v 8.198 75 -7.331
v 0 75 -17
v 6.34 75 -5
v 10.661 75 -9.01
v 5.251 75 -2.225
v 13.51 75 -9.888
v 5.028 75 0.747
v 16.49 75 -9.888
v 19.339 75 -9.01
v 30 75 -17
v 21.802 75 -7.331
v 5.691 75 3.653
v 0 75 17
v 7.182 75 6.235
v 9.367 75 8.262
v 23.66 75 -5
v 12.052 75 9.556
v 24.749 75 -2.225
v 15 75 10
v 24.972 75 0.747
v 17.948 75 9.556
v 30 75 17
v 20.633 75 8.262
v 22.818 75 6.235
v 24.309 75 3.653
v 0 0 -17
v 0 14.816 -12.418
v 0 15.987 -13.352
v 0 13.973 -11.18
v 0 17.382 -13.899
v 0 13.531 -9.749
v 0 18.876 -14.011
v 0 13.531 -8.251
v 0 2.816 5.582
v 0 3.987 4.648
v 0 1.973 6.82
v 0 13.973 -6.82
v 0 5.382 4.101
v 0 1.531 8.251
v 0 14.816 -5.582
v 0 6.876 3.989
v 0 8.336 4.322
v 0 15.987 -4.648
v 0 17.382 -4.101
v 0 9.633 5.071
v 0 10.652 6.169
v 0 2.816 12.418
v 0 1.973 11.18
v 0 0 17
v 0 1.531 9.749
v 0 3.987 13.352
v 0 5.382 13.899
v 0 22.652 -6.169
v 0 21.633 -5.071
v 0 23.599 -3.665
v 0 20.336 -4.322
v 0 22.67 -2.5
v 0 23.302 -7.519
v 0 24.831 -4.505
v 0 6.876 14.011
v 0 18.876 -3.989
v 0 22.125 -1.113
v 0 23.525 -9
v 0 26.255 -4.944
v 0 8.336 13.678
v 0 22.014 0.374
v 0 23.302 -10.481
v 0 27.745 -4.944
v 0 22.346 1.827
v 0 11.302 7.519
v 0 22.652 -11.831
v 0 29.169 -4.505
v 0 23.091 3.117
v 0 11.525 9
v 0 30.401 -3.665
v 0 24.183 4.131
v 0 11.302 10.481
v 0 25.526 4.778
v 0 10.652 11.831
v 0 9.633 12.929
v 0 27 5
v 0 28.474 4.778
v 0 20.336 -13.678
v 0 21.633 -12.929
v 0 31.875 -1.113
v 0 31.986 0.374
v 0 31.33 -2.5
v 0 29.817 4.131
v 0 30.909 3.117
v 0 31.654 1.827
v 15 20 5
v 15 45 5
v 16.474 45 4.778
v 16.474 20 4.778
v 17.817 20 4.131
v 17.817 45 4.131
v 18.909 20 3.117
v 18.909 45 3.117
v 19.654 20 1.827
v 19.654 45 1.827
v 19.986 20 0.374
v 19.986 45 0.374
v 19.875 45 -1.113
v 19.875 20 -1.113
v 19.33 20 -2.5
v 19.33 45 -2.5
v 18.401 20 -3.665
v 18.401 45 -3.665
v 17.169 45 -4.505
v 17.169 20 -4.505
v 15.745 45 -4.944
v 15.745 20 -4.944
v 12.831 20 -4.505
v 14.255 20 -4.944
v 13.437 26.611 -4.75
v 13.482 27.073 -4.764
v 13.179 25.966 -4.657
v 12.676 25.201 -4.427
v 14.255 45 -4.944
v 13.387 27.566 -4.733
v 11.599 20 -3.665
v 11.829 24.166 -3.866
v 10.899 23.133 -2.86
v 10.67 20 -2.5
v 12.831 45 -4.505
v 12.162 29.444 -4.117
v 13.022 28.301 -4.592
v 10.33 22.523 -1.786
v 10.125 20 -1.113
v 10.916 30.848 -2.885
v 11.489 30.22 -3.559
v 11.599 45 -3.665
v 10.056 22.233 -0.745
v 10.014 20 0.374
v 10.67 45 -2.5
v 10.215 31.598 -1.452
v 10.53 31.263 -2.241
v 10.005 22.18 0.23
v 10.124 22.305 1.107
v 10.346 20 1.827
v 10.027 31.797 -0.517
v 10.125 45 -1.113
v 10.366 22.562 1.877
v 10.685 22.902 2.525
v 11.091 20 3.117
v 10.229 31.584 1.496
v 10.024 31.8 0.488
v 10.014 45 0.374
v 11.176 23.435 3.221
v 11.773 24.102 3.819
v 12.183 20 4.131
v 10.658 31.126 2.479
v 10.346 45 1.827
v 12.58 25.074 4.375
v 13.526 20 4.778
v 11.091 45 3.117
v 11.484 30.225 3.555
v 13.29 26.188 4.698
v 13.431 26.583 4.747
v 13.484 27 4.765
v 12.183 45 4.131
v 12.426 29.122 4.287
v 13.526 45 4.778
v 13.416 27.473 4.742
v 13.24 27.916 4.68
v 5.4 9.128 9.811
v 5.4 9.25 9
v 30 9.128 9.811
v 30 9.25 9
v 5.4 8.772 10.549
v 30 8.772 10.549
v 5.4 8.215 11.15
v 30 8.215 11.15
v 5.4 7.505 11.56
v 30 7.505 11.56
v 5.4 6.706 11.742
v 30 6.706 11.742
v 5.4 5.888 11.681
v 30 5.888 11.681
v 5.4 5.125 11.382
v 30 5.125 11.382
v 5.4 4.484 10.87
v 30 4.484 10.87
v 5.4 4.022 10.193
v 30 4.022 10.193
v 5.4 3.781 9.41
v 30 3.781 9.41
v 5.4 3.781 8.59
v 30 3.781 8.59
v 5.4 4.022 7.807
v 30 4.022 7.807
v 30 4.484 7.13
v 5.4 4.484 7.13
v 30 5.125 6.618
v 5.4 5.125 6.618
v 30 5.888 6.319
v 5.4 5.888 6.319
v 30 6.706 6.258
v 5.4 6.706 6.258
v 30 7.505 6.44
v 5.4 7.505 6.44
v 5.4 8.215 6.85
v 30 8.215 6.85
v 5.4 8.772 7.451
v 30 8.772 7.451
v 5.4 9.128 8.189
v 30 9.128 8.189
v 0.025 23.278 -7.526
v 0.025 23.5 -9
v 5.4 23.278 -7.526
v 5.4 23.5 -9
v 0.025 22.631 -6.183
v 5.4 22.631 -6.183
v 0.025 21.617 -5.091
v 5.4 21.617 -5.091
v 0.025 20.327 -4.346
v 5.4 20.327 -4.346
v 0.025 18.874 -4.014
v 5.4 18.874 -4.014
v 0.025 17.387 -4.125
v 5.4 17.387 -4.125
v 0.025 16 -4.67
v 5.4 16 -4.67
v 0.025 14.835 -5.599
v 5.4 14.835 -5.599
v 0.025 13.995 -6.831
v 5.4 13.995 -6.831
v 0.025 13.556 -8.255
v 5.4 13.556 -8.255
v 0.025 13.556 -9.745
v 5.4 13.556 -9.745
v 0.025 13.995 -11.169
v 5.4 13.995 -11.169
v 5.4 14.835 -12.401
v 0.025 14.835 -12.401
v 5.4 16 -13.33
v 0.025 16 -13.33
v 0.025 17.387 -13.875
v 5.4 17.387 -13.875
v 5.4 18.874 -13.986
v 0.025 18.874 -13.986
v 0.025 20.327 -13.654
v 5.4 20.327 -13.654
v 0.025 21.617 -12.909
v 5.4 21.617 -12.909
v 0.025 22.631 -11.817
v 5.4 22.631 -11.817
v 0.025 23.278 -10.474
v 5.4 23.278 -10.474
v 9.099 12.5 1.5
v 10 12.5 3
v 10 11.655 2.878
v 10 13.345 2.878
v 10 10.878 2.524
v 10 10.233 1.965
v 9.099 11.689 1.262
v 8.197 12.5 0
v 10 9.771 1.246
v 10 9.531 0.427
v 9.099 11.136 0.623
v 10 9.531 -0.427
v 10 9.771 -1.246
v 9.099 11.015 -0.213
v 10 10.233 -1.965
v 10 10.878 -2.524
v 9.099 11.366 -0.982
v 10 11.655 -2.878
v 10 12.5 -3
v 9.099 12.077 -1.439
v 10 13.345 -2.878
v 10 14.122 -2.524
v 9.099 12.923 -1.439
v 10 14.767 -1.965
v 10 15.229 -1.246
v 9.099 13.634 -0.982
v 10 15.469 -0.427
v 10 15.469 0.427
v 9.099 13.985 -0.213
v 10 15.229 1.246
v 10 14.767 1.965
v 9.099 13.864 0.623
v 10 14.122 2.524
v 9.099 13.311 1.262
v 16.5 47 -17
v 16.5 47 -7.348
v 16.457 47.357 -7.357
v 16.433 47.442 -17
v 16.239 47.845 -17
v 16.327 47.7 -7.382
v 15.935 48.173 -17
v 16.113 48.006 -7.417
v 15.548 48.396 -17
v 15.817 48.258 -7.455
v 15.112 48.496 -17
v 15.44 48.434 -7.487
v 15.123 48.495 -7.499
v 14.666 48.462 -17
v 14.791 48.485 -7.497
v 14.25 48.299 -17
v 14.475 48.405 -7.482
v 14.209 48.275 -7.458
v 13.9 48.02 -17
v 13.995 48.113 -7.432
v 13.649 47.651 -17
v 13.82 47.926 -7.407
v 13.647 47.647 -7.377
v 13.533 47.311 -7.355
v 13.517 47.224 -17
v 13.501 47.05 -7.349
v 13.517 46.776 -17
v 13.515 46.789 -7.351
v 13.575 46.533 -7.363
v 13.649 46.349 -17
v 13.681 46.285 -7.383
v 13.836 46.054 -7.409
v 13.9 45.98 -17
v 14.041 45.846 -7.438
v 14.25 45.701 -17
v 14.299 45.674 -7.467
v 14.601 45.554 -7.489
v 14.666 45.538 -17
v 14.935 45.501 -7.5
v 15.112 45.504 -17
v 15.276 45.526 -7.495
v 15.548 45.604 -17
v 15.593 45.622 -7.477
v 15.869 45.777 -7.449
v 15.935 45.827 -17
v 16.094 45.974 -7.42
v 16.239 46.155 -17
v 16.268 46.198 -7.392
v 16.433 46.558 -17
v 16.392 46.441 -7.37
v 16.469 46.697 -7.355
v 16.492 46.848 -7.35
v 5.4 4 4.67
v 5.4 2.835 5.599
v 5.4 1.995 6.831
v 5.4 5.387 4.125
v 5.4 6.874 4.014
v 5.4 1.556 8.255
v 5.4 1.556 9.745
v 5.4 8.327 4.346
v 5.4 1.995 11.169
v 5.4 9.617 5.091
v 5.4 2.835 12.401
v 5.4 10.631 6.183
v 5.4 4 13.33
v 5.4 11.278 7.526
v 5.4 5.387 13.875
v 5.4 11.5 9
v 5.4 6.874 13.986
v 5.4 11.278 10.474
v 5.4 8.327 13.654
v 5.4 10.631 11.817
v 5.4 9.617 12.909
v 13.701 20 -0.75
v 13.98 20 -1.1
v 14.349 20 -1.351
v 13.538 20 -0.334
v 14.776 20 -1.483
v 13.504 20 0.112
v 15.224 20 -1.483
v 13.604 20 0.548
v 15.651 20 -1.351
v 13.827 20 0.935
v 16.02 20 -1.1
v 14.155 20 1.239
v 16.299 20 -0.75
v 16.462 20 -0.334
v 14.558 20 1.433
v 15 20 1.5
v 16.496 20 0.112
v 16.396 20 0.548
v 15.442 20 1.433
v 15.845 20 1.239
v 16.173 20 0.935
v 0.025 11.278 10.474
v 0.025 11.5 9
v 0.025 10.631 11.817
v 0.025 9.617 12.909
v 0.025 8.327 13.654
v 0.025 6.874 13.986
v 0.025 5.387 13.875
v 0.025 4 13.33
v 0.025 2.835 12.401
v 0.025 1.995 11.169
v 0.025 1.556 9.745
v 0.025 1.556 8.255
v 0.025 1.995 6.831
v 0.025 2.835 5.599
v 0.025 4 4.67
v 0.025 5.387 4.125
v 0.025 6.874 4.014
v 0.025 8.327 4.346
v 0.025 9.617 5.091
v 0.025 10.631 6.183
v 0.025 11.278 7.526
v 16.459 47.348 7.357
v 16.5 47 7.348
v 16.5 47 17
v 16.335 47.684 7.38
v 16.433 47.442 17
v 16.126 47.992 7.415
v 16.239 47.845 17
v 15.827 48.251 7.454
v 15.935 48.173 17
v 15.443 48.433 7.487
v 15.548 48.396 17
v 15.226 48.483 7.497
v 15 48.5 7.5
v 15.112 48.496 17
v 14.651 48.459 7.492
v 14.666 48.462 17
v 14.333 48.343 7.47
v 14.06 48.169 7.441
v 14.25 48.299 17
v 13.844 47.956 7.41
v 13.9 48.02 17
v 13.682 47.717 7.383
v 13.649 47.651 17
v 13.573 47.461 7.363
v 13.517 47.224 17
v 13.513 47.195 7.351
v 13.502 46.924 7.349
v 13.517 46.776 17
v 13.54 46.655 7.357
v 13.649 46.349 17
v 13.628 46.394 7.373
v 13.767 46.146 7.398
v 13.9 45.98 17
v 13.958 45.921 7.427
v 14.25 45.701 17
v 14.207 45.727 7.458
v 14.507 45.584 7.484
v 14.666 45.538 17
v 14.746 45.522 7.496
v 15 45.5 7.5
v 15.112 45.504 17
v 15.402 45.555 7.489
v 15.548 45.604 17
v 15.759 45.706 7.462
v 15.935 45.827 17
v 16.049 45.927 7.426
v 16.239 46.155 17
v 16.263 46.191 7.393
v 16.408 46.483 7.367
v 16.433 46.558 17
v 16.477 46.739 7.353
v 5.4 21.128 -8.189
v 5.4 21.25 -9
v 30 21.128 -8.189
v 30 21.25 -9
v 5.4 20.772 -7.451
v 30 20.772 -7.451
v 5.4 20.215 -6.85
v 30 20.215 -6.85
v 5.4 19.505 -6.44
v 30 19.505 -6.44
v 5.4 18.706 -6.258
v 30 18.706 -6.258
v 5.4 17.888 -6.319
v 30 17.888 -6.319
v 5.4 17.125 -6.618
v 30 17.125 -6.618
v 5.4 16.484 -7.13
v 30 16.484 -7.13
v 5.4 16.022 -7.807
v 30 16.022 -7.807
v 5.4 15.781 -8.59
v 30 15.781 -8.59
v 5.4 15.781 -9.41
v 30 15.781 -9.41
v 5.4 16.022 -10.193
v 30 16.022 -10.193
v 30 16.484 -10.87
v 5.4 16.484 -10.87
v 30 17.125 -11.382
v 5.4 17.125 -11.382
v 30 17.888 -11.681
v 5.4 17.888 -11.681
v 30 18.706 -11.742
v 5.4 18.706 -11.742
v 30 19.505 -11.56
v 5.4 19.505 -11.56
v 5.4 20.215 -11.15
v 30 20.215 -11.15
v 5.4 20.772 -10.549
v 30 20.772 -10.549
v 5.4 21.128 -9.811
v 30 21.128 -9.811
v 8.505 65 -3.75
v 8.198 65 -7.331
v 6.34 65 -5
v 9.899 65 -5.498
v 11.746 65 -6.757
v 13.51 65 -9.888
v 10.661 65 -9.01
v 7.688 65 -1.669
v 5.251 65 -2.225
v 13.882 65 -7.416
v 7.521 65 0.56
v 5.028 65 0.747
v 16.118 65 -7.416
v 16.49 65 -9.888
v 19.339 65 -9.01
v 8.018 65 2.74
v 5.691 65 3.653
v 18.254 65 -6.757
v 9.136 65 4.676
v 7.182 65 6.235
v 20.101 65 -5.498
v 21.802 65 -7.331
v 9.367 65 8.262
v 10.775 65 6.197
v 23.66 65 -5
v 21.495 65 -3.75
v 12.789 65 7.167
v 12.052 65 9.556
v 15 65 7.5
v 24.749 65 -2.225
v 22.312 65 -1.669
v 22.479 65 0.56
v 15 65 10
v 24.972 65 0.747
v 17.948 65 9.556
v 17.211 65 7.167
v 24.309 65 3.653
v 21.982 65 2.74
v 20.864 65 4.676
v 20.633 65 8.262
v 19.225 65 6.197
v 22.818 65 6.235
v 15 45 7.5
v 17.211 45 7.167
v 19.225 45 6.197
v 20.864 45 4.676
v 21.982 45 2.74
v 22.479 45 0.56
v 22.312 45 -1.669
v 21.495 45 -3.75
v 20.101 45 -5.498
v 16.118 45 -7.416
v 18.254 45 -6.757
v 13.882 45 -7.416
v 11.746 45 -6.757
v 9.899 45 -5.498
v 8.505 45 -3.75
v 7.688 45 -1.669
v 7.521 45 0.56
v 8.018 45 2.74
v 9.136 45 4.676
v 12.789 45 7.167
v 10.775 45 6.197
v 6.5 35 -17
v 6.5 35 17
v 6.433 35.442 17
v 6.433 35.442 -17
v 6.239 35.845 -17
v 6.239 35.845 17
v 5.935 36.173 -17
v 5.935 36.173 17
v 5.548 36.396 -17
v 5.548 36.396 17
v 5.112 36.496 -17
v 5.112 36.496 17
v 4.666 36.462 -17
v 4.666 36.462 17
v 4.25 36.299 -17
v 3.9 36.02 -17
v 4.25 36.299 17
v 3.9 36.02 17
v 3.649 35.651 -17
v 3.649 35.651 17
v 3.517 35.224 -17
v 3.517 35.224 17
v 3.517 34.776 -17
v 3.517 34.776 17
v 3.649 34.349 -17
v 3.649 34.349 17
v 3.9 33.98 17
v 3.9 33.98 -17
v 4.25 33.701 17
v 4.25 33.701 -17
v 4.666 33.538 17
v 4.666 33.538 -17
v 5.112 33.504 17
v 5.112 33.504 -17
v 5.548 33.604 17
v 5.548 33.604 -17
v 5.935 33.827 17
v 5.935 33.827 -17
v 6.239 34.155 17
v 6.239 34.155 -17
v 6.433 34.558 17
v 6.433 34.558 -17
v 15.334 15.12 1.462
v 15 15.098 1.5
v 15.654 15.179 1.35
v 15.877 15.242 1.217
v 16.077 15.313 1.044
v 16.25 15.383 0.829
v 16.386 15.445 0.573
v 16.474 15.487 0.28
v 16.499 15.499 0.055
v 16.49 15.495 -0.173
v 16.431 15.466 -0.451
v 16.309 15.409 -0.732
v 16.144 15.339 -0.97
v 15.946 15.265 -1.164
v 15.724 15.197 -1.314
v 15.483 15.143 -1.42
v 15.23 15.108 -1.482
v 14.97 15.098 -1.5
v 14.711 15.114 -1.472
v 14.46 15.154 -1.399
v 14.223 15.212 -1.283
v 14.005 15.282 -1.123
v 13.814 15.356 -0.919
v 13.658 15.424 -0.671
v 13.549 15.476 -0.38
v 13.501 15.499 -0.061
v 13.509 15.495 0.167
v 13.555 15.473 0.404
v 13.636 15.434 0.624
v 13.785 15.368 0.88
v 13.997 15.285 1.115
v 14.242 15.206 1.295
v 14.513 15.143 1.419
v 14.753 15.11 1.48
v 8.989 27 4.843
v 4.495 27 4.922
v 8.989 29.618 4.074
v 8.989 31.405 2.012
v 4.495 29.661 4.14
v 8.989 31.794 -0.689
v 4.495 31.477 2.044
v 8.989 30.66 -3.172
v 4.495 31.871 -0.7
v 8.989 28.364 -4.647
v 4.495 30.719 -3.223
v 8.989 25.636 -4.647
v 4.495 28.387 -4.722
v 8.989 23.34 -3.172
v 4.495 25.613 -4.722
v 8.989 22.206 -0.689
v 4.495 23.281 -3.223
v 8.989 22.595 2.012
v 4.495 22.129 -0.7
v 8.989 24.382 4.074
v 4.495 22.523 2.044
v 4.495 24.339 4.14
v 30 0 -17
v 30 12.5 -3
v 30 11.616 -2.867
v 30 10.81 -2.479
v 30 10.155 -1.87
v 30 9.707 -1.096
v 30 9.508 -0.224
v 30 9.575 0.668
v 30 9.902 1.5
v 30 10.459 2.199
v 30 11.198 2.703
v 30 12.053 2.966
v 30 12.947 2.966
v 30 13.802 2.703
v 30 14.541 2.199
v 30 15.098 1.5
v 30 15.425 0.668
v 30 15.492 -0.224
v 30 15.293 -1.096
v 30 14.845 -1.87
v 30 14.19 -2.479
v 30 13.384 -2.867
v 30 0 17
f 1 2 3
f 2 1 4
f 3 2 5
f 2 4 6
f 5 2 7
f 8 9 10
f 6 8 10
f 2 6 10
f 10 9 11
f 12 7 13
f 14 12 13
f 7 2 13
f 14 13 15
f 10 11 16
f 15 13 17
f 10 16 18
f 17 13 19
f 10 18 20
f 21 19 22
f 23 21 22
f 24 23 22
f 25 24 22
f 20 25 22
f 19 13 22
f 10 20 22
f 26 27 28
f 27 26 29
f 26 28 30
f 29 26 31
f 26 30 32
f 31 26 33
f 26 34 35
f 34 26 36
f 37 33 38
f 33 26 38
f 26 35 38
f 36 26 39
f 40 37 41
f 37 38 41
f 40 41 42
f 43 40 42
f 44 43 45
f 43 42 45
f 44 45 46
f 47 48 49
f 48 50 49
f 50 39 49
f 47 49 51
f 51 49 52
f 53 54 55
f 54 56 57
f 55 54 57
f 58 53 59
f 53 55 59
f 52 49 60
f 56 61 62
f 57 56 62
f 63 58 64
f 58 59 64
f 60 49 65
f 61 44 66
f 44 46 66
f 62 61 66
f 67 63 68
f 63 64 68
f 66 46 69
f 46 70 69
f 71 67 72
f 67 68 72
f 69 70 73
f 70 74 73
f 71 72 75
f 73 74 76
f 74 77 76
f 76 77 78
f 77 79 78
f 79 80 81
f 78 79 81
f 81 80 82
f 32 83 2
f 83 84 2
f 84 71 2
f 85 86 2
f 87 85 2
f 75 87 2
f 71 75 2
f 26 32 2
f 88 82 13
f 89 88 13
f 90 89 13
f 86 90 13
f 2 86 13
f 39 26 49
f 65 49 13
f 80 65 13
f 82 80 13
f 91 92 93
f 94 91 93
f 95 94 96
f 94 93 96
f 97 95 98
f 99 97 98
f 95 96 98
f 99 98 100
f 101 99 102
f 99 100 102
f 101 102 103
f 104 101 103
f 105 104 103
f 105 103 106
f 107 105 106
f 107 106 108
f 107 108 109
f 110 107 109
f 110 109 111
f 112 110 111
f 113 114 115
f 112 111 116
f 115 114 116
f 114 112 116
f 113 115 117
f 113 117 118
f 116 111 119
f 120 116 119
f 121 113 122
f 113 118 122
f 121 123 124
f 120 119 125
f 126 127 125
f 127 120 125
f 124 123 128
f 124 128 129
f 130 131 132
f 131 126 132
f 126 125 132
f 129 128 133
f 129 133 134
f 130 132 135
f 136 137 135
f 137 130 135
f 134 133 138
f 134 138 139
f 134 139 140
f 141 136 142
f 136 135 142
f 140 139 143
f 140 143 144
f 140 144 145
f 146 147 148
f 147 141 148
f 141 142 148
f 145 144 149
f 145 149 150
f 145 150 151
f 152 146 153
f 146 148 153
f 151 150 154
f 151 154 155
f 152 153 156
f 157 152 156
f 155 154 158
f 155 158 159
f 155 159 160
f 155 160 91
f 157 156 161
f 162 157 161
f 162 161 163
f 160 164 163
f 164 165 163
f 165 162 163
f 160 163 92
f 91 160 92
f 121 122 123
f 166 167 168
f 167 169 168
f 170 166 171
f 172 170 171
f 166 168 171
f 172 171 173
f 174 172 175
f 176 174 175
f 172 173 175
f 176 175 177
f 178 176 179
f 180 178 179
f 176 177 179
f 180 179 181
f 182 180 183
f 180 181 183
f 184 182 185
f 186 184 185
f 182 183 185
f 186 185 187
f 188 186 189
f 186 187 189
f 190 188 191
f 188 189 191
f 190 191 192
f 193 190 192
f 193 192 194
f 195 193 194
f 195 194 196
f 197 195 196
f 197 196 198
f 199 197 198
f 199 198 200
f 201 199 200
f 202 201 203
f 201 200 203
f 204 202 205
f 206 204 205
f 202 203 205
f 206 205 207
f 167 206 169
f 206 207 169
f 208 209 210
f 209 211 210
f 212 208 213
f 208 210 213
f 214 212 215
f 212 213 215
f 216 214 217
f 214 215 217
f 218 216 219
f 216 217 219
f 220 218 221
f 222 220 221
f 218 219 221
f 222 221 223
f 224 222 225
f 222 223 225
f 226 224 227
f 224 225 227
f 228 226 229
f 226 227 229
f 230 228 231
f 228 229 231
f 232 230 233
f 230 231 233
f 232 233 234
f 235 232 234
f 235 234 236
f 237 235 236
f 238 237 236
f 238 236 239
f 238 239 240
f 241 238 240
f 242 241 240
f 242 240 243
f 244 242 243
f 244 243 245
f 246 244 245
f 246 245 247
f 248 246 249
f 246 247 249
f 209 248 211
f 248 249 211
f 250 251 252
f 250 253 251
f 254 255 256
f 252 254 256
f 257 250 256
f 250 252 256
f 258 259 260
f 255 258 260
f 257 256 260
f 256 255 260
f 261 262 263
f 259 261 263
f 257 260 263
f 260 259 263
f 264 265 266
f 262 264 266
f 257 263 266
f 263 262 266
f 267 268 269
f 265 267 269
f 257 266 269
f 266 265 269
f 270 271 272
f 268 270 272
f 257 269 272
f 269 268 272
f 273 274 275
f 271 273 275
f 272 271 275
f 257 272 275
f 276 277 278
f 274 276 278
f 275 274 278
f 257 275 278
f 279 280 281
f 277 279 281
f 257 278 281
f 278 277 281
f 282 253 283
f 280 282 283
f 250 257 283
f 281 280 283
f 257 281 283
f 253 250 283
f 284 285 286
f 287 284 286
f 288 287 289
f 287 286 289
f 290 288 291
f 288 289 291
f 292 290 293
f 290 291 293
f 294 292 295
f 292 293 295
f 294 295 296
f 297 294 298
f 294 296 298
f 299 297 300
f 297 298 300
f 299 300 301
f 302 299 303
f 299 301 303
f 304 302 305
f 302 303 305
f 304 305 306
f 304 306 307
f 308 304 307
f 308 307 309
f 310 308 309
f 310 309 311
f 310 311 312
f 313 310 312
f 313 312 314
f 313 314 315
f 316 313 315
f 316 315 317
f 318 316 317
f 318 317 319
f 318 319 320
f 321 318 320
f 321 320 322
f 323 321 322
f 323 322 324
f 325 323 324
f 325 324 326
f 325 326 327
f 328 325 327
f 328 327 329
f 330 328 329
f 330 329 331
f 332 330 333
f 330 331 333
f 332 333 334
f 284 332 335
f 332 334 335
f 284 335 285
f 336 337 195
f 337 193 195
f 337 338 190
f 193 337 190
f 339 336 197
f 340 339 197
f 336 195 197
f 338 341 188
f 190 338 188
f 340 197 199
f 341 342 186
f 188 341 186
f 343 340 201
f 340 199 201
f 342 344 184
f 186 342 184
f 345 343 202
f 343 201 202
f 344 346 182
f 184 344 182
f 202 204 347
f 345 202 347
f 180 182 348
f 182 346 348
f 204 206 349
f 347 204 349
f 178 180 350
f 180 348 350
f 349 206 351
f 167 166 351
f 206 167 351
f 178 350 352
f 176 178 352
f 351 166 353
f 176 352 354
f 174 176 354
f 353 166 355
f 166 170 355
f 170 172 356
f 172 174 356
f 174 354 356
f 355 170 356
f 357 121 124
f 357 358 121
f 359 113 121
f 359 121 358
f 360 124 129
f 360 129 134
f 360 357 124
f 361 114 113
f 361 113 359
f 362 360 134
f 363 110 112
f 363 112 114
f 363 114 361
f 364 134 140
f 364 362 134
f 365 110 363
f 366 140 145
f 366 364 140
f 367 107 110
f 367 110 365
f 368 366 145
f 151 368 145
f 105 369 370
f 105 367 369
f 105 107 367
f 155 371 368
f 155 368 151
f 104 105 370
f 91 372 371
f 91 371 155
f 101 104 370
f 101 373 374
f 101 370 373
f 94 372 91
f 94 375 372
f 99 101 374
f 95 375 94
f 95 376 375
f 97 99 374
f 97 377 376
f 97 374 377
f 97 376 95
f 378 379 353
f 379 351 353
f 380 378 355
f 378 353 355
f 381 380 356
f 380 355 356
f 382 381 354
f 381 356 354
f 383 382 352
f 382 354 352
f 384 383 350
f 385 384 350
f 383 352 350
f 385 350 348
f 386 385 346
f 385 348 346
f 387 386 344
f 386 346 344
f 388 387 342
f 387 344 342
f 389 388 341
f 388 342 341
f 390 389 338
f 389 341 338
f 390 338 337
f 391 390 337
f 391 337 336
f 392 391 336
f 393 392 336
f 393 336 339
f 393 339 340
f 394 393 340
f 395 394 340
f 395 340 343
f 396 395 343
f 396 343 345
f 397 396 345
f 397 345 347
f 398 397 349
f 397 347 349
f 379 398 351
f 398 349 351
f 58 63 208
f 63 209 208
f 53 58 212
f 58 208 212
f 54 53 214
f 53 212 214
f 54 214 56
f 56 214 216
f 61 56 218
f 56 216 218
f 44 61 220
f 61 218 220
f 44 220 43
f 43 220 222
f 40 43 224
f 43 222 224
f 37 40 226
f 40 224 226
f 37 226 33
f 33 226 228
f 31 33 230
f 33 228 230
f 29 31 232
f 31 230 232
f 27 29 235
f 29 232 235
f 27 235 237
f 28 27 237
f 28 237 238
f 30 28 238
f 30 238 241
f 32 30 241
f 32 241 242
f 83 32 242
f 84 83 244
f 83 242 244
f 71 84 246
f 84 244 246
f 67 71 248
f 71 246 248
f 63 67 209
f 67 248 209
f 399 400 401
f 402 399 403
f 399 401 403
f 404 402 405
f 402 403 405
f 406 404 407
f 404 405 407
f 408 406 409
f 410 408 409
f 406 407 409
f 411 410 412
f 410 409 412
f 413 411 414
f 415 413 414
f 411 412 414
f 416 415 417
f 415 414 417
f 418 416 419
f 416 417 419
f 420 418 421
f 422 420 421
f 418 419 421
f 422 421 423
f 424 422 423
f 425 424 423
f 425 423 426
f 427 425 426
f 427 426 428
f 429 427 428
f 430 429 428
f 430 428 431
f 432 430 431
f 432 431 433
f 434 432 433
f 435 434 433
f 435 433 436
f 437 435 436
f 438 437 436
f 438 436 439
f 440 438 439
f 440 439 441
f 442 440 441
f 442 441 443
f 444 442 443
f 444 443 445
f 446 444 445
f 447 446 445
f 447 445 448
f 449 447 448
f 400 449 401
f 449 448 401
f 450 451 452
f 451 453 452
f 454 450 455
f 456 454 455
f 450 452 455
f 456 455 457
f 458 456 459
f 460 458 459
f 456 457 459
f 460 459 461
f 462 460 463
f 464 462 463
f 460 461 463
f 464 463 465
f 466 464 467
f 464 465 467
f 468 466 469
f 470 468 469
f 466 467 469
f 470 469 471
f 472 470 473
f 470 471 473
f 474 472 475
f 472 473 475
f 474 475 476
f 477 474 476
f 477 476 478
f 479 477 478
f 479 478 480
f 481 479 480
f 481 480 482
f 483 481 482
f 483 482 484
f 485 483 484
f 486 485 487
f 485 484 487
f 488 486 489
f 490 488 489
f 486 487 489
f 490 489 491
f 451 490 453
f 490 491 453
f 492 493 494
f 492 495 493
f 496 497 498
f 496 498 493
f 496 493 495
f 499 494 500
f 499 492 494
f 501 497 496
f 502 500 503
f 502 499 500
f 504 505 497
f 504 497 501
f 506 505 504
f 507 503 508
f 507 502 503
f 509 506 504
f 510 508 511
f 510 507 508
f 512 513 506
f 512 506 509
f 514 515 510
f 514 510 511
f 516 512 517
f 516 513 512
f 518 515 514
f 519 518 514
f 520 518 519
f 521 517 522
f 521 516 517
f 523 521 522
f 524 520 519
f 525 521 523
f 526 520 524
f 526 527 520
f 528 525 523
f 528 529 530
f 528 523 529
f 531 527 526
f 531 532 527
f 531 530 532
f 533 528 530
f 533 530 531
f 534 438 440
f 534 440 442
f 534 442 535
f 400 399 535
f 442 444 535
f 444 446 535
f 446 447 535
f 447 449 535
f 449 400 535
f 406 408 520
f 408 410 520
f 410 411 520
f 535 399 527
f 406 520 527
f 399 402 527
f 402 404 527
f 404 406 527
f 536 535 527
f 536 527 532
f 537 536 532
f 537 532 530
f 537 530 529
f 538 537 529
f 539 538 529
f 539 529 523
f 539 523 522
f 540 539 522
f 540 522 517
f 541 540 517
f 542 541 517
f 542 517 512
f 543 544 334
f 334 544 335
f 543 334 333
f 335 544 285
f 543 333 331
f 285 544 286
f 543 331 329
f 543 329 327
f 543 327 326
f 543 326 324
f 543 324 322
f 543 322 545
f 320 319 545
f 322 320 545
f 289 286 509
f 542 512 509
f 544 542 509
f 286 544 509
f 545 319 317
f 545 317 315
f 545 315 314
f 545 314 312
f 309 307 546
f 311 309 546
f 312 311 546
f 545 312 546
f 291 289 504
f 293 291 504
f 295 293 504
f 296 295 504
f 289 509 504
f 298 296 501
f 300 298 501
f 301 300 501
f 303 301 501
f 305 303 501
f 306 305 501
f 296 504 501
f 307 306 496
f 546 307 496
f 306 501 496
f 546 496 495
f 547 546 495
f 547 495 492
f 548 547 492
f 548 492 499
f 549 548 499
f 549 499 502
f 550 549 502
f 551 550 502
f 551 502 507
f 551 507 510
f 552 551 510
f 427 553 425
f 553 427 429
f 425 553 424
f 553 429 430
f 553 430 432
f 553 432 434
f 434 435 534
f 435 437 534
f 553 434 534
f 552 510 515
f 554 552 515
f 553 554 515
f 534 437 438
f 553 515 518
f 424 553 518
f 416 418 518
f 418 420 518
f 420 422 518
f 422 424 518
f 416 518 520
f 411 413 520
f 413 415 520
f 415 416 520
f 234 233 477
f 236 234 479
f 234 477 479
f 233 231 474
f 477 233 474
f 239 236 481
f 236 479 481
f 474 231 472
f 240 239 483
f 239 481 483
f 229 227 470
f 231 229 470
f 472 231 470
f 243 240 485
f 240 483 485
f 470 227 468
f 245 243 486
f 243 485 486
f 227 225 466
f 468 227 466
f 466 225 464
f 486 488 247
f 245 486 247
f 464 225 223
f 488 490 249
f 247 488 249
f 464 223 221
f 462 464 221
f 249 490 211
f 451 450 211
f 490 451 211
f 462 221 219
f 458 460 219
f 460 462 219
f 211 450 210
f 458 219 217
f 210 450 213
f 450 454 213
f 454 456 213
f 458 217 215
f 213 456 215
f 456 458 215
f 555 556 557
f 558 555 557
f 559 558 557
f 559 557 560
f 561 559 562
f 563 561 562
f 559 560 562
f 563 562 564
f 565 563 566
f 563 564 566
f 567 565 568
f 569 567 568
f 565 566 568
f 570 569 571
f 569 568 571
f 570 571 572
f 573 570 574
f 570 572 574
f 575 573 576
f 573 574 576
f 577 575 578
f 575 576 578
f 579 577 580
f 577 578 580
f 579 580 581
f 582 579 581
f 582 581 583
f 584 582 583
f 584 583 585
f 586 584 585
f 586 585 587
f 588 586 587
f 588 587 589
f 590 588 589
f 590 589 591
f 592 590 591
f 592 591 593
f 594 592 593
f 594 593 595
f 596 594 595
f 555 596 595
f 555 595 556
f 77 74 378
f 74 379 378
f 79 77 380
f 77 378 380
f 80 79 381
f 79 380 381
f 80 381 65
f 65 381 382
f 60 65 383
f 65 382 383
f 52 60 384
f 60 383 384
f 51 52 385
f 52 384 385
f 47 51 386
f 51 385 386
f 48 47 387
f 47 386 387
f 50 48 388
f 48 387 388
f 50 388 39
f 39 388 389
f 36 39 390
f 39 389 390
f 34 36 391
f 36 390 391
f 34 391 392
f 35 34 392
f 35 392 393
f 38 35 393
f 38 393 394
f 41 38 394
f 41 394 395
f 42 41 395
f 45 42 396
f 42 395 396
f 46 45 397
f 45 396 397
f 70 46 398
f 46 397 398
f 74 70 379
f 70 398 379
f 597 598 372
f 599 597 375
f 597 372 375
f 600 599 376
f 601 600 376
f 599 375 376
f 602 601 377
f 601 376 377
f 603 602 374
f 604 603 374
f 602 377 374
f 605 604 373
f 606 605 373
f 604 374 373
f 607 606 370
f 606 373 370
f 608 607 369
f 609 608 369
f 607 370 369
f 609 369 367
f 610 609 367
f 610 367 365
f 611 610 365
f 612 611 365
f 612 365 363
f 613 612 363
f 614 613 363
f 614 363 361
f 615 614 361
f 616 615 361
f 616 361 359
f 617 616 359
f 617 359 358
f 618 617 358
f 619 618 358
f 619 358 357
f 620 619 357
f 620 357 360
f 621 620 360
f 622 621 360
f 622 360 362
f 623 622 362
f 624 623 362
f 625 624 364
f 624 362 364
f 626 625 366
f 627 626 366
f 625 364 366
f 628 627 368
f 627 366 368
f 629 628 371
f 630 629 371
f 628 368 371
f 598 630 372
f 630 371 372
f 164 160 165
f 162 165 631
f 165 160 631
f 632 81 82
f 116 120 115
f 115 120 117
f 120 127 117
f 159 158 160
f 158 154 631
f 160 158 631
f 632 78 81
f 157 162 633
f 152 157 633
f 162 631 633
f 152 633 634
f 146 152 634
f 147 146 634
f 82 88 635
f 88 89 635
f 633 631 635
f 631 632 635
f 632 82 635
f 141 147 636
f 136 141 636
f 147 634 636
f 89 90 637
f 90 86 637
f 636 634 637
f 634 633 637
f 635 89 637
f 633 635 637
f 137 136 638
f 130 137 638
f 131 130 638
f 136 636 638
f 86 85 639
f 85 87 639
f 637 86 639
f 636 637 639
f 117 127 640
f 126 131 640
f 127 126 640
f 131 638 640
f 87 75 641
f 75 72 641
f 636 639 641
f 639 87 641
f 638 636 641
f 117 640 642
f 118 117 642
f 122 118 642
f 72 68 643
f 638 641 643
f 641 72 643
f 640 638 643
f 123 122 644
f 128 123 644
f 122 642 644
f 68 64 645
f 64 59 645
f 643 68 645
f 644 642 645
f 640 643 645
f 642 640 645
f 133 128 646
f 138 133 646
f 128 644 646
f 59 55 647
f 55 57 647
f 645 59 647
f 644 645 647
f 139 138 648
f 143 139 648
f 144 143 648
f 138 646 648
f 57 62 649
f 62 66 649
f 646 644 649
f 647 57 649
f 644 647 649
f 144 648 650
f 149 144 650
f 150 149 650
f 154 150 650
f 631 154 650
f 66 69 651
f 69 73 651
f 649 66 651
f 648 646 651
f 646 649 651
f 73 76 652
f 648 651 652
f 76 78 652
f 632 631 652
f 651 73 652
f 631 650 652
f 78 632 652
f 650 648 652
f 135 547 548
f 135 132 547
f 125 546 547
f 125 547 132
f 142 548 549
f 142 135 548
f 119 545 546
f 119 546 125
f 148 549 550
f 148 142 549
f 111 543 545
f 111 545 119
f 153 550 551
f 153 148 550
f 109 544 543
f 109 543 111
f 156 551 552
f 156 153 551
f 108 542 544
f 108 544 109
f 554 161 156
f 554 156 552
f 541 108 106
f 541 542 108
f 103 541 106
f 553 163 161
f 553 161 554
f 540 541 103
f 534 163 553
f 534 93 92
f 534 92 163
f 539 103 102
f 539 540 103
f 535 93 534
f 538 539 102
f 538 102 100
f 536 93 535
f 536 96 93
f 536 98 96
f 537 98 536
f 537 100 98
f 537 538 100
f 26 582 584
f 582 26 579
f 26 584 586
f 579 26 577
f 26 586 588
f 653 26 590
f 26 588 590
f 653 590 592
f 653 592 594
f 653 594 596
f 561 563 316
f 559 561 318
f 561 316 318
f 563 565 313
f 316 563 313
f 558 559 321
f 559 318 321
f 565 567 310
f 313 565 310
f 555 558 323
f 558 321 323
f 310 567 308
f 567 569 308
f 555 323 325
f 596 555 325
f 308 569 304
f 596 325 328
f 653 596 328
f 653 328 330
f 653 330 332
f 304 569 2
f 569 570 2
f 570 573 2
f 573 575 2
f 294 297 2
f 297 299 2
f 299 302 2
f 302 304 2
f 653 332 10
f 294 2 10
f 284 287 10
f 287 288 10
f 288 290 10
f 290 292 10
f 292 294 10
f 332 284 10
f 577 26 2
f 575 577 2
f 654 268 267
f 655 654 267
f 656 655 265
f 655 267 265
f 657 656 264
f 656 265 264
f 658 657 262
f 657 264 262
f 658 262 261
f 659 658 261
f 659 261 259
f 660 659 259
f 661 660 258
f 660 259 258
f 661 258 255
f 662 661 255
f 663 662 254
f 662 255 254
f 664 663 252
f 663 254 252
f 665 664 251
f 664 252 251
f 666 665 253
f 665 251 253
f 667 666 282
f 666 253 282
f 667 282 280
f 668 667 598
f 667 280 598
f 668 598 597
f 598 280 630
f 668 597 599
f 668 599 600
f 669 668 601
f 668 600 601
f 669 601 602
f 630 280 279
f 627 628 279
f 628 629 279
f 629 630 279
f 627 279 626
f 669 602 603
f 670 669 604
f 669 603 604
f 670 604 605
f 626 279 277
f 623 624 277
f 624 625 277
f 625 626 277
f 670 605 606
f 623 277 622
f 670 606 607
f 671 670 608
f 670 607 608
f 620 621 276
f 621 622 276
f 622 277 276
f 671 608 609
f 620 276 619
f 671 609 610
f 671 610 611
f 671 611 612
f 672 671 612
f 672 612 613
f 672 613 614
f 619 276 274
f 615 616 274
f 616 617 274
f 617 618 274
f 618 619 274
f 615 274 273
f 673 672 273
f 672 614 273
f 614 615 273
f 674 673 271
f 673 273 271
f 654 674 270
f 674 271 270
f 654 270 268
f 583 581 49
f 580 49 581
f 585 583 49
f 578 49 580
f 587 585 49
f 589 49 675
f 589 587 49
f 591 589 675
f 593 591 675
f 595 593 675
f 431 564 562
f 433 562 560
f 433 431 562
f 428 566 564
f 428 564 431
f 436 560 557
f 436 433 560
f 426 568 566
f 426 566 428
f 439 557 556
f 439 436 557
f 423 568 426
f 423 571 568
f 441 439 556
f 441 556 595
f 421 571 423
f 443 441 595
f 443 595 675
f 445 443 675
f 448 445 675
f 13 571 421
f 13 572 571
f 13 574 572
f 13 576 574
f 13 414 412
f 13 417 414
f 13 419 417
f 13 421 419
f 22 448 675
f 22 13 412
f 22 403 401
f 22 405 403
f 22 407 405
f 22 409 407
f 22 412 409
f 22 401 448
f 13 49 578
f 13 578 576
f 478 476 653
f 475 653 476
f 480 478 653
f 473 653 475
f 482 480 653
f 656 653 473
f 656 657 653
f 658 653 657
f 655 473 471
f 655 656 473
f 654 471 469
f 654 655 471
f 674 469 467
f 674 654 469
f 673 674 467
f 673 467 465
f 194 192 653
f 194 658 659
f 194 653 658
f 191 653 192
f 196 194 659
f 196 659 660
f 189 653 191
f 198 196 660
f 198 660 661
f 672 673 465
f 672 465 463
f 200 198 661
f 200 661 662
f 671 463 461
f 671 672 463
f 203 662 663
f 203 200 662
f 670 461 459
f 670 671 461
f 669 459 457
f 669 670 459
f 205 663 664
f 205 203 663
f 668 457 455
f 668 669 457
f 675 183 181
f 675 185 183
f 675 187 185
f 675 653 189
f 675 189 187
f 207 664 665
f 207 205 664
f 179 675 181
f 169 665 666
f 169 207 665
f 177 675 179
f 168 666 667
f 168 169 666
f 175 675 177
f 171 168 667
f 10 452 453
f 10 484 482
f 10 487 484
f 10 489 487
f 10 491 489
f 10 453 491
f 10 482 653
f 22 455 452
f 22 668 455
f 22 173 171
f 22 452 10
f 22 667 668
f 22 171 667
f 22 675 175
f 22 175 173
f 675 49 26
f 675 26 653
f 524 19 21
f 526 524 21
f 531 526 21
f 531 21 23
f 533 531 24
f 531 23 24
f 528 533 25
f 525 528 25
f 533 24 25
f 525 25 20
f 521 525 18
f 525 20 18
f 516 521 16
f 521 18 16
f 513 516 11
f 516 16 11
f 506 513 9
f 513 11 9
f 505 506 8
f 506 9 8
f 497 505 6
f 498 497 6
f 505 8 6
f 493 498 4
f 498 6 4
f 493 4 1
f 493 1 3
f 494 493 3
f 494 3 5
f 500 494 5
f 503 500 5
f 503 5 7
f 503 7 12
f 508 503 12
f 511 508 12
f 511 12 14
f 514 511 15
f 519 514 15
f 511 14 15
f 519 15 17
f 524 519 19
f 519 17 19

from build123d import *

# Parameters (mm, degrees)
SCHIZZO1_W                    = 30
SCHIZZO1_H                    = 75
ESTRUSIONE_ESTRUSIONE1_DEPTH  = 17
FORO_6_0_6_1_D                = 6
FORO_6_0_6_1_DEPTH            = 20
FORO_6_0_6_1_TIP              = 1.802581857
SCHIZZO6_R                    = 10
TAGLIO_ESTRUSIONE1_DEPTH      = 10
SCHIZZO7_R                    = 7.5
TAGLIO_ESTRUSIONE2_DEPTH      = 20
SCHIZZO8_R                    = 5
TAGLIO_ESTRUSIONE3_DEPTH      = 25
TAGLIO_ESTRUSIONE4_REACH      = 66.915
TAGLIO_ESTRUSIONE4_END_RADIUS = 3
SCHIZZO9_R                    = 1.5
TAGLIO_ESTRUSIONE5_REACH      = 84.547
TAGLIO_ESTRUSIONE5_END_RADIUS = 5
SCHIZZO10_R                   = 5
TAGLIO_ESTRUSIONE5_DRAFT      = -1
TAGLIO_ESTRUSIONE6_REACH      = 89.641
SCHIZZO11_R                   = 1.5


# Read off the part's stored shape, not the designer's step: Foro lamato per Vite M5 a testa cilindrica-1
with BuildPart() as part:
    # Schizzo1 → Estrusione-Estrusione1 (new, symmetric)
    with BuildSketch(Plane.XY):
        with Locations((15, 37.5)):
            Rectangle(SCHIZZO1_W, SCHIZZO1_H)
    extrude(amount=ESTRUSIONE_ESTRUSIONE1_DEPTH, both=True)

    # Foro Ø6.0 (6)-1
    with Locations(Plane(origin=(30, 12.5, 0), x_dir=(0, 0, 1), z_dir=(1, 0, 0))):
        with Locations((0, 0)):
            Hole(FORO_6_0_6_1_D / 2, depth=FORO_6_0_6_1_DEPTH)
            with Locations((0, 0, -(FORO_6_0_6_1_DEPTH + FORO_6_0_6_1_TIP / 2))):  # 118° drill point
                Cone(0, FORO_6_0_6_1_D / 2, FORO_6_0_6_1_TIP, mode=Mode.SUBTRACT)

    # Foro lamato per Vite M5 a testa cili 2 → Foro lamato per Vite M5 a testa cilindrica-1 (revolve, cut)
    with BuildSketch(Plane(origin=(0, 6.5, 9), x_dir=(0, 1, 0), z_dir=(0, 0, -1))):
        Polygon((2.75, 5.4), (2.75, 30), (0, 30), (0, 0), (5.025, 0), (5, 0.025), (5, 5.4), align=None)
    revolve(axis=Axis((0, 6.5, 9), (1, 0, 0)), mode=Mode.SUBTRACT)

    # Foro lamato per Vite M5 a testa cili 3 o → Foro lamato per Vite M5 a testa cili 3 (revolve, cut)
    with BuildSketch(Plane(origin=(0, 18.5, -9), x_dir=(0, 1, 0), z_dir=(0, 0, -1))):
        Polygon((0, 0), (5.025, 0), (5, 0.025), (5, 5.4), (2.75, 5.4), (2.75, 30), (0, 30), align=None)
    revolve(axis=Axis((0, 18.5, -9), (1, 0, 0)), mode=Mode.SUBTRACT)

    # Schizzo6 → Taglio-Estrusione1 (cut)
    with BuildSketch(Plane(origin=(0, 75, 0), x_dir=(1, 0, 0), z_dir=(0, 1, 0))):
        with Locations(Location((15, 0, 0), (0, 0, 270))):
            Circle(SCHIZZO6_R)
    extrude(amount=-TAGLIO_ESTRUSIONE1_DEPTH, mode=Mode.SUBTRACT)

    # Schizzo7 → Taglio-Estrusione2 (cut)
    with BuildSketch(Plane(origin=(0, 65, 0), x_dir=(1, 0, 0), z_dir=(0, 1, 0))):
        with Locations(Location((15, 0, 0), (0, 0, 270))):
            Circle(SCHIZZO7_R)
    extrude(amount=-TAGLIO_ESTRUSIONE2_DEPTH, mode=Mode.SUBTRACT)

    # Schizzo8 → Taglio-Estrusione3 (cut)
    with BuildSketch(Plane(origin=(0, 45, 0), x_dir=(1, 0, 0), z_dir=(0, 1, 0))):
        with Locations(Location((15, 0, 0), (0, 0, 270))):
            Circle(SCHIZZO8_R)
    extrude(amount=-TAGLIO_ESTRUSIONE3_DEPTH, mode=Mode.SUBTRACT)

    # Taglio-Estrusione4: up to this cylinder (the profile starts outside it)
    taglio_estrusione4_end = Plane(origin=(15, 12.5, 0), z_dir=(1, 0, 0)) * Cylinder(TAGLIO_ESTRUSIONE4_END_RADIUS, 140.83, mode=Mode.PRIVATE)
    # Schizzo9 → Taglio-Estrusione4 (cut, up to the surface)
    with BuildSketch(Plane(origin=(0, 20, 0), x_dir=(1, 0, 0), z_dir=(0, 1, 0)), mode=Mode.PRIVATE) as taglio_estrusione4_sk1:
        with Locations(Location((15, 0, 0), (0, 0, 270))):
            Circle(SCHIZZO9_R)
    taglio_estrusione4_tool1 = extrude(taglio_estrusione4_sk1.sketch, amount=-TAGLIO_ESTRUSIONE4_REACH, mode=Mode.PRIVATE) - taglio_estrusione4_end
    add(taglio_estrusione4_tool1.solids().sort_by_distance((15, 20, 0))[0], mode=Mode.SUBTRACT)

    # Taglio-Estrusione5: up to this cylinder (the profile starts outside it)
    taglio_estrusione5_end = Plane(origin=(15, 27, 0), z_dir=(0, 1, 0)) * Cylinder(TAGLIO_ESTRUSIONE5_END_RADIUS, 180.094, mode=Mode.PRIVATE)



with BuildPart() as taglio_estrusione5_long_prism_1:
    # Schizzo10 → Taglio-Estrusione5 (the long prism of profile 1, to be tilted and cut off)
    with BuildSketch(Plane.ZY):
        with Locations((0, 27)):
            Circle(SCHIZZO10_R)
    extrude(amount=-TAGLIO_ESTRUSIONE5_REACH)
    taglio_estrusione5_tool1_sides = [taglio_estrusione5_long_prism_1.faces().sort_by_distance(p)[0] for p in [
        (42.2735, 27, -5),
    ]]
    draft(taglio_estrusione5_tool1_sides, Plane.ZY, TAGLIO_ESTRUSIONE5_DRAFT)  # the draft: side faces tilted about the start plane


with BuildPart() as part_1:
    add(part.part)
    taglio_estrusione5_tool1 = taglio_estrusione5_long_prism_1.part - taglio_estrusione5_end
    add(taglio_estrusione5_tool1.solids().sort_by_distance((0, 27, 0))[0], mode=Mode.SUBTRACT)

    # Taglio-Estrusione6: up to this face of the body (flat: up to its plane)
    taglio_estrusione6_end = Plane(part_1.part.faces().sort_by_distance((15, 37.5, -17))[0])
    # Schizzo11 → Taglio-Estrusione6 (cut, up to the picked face)
    with BuildSketch(Plane.XY.offset(17), mode=Mode.PRIVATE) as taglio_estrusione6_sk1:
        with Locations((5, 35)):
            Circle(SCHIZZO11_R)
    taglio_estrusione6_tool1 = split(extrude(taglio_estrusione6_sk1.sketch, amount=-TAGLIO_ESTRUSIONE6_REACH, mode=Mode.PRIVATE), bisect_by=taglio_estrusione6_end, keep=Keep.BOTH, mode=Mode.PRIVATE)
    # Schizzo11 → Taglio-Estrusione6 (cut, up to the picked face)
    with BuildSketch(Plane.XY.offset(17), mode=Mode.PRIVATE) as taglio_estrusione6_sk2:
        with Locations((15, 47)):
            Circle(SCHIZZO11_R)
    taglio_estrusione6_tool2 = split(extrude(taglio_estrusione6_sk2.sketch, amount=-TAGLIO_ESTRUSIONE6_REACH, mode=Mode.PRIVATE), bisect_by=taglio_estrusione6_end, keep=Keep.BOTH, mode=Mode.PRIVATE)
    add(taglio_estrusione6_tool1.solids().sort_by(Axis((5, 35, 17), (0, 0, -1)))[0], mode=Mode.SUBTRACT)
    add(taglio_estrusione6_tool2.solids().sort_by(Axis((15, 47, 17), (0, 0, -1)))[0], mode=Mode.SUBTRACT)


solid = part_1.part
